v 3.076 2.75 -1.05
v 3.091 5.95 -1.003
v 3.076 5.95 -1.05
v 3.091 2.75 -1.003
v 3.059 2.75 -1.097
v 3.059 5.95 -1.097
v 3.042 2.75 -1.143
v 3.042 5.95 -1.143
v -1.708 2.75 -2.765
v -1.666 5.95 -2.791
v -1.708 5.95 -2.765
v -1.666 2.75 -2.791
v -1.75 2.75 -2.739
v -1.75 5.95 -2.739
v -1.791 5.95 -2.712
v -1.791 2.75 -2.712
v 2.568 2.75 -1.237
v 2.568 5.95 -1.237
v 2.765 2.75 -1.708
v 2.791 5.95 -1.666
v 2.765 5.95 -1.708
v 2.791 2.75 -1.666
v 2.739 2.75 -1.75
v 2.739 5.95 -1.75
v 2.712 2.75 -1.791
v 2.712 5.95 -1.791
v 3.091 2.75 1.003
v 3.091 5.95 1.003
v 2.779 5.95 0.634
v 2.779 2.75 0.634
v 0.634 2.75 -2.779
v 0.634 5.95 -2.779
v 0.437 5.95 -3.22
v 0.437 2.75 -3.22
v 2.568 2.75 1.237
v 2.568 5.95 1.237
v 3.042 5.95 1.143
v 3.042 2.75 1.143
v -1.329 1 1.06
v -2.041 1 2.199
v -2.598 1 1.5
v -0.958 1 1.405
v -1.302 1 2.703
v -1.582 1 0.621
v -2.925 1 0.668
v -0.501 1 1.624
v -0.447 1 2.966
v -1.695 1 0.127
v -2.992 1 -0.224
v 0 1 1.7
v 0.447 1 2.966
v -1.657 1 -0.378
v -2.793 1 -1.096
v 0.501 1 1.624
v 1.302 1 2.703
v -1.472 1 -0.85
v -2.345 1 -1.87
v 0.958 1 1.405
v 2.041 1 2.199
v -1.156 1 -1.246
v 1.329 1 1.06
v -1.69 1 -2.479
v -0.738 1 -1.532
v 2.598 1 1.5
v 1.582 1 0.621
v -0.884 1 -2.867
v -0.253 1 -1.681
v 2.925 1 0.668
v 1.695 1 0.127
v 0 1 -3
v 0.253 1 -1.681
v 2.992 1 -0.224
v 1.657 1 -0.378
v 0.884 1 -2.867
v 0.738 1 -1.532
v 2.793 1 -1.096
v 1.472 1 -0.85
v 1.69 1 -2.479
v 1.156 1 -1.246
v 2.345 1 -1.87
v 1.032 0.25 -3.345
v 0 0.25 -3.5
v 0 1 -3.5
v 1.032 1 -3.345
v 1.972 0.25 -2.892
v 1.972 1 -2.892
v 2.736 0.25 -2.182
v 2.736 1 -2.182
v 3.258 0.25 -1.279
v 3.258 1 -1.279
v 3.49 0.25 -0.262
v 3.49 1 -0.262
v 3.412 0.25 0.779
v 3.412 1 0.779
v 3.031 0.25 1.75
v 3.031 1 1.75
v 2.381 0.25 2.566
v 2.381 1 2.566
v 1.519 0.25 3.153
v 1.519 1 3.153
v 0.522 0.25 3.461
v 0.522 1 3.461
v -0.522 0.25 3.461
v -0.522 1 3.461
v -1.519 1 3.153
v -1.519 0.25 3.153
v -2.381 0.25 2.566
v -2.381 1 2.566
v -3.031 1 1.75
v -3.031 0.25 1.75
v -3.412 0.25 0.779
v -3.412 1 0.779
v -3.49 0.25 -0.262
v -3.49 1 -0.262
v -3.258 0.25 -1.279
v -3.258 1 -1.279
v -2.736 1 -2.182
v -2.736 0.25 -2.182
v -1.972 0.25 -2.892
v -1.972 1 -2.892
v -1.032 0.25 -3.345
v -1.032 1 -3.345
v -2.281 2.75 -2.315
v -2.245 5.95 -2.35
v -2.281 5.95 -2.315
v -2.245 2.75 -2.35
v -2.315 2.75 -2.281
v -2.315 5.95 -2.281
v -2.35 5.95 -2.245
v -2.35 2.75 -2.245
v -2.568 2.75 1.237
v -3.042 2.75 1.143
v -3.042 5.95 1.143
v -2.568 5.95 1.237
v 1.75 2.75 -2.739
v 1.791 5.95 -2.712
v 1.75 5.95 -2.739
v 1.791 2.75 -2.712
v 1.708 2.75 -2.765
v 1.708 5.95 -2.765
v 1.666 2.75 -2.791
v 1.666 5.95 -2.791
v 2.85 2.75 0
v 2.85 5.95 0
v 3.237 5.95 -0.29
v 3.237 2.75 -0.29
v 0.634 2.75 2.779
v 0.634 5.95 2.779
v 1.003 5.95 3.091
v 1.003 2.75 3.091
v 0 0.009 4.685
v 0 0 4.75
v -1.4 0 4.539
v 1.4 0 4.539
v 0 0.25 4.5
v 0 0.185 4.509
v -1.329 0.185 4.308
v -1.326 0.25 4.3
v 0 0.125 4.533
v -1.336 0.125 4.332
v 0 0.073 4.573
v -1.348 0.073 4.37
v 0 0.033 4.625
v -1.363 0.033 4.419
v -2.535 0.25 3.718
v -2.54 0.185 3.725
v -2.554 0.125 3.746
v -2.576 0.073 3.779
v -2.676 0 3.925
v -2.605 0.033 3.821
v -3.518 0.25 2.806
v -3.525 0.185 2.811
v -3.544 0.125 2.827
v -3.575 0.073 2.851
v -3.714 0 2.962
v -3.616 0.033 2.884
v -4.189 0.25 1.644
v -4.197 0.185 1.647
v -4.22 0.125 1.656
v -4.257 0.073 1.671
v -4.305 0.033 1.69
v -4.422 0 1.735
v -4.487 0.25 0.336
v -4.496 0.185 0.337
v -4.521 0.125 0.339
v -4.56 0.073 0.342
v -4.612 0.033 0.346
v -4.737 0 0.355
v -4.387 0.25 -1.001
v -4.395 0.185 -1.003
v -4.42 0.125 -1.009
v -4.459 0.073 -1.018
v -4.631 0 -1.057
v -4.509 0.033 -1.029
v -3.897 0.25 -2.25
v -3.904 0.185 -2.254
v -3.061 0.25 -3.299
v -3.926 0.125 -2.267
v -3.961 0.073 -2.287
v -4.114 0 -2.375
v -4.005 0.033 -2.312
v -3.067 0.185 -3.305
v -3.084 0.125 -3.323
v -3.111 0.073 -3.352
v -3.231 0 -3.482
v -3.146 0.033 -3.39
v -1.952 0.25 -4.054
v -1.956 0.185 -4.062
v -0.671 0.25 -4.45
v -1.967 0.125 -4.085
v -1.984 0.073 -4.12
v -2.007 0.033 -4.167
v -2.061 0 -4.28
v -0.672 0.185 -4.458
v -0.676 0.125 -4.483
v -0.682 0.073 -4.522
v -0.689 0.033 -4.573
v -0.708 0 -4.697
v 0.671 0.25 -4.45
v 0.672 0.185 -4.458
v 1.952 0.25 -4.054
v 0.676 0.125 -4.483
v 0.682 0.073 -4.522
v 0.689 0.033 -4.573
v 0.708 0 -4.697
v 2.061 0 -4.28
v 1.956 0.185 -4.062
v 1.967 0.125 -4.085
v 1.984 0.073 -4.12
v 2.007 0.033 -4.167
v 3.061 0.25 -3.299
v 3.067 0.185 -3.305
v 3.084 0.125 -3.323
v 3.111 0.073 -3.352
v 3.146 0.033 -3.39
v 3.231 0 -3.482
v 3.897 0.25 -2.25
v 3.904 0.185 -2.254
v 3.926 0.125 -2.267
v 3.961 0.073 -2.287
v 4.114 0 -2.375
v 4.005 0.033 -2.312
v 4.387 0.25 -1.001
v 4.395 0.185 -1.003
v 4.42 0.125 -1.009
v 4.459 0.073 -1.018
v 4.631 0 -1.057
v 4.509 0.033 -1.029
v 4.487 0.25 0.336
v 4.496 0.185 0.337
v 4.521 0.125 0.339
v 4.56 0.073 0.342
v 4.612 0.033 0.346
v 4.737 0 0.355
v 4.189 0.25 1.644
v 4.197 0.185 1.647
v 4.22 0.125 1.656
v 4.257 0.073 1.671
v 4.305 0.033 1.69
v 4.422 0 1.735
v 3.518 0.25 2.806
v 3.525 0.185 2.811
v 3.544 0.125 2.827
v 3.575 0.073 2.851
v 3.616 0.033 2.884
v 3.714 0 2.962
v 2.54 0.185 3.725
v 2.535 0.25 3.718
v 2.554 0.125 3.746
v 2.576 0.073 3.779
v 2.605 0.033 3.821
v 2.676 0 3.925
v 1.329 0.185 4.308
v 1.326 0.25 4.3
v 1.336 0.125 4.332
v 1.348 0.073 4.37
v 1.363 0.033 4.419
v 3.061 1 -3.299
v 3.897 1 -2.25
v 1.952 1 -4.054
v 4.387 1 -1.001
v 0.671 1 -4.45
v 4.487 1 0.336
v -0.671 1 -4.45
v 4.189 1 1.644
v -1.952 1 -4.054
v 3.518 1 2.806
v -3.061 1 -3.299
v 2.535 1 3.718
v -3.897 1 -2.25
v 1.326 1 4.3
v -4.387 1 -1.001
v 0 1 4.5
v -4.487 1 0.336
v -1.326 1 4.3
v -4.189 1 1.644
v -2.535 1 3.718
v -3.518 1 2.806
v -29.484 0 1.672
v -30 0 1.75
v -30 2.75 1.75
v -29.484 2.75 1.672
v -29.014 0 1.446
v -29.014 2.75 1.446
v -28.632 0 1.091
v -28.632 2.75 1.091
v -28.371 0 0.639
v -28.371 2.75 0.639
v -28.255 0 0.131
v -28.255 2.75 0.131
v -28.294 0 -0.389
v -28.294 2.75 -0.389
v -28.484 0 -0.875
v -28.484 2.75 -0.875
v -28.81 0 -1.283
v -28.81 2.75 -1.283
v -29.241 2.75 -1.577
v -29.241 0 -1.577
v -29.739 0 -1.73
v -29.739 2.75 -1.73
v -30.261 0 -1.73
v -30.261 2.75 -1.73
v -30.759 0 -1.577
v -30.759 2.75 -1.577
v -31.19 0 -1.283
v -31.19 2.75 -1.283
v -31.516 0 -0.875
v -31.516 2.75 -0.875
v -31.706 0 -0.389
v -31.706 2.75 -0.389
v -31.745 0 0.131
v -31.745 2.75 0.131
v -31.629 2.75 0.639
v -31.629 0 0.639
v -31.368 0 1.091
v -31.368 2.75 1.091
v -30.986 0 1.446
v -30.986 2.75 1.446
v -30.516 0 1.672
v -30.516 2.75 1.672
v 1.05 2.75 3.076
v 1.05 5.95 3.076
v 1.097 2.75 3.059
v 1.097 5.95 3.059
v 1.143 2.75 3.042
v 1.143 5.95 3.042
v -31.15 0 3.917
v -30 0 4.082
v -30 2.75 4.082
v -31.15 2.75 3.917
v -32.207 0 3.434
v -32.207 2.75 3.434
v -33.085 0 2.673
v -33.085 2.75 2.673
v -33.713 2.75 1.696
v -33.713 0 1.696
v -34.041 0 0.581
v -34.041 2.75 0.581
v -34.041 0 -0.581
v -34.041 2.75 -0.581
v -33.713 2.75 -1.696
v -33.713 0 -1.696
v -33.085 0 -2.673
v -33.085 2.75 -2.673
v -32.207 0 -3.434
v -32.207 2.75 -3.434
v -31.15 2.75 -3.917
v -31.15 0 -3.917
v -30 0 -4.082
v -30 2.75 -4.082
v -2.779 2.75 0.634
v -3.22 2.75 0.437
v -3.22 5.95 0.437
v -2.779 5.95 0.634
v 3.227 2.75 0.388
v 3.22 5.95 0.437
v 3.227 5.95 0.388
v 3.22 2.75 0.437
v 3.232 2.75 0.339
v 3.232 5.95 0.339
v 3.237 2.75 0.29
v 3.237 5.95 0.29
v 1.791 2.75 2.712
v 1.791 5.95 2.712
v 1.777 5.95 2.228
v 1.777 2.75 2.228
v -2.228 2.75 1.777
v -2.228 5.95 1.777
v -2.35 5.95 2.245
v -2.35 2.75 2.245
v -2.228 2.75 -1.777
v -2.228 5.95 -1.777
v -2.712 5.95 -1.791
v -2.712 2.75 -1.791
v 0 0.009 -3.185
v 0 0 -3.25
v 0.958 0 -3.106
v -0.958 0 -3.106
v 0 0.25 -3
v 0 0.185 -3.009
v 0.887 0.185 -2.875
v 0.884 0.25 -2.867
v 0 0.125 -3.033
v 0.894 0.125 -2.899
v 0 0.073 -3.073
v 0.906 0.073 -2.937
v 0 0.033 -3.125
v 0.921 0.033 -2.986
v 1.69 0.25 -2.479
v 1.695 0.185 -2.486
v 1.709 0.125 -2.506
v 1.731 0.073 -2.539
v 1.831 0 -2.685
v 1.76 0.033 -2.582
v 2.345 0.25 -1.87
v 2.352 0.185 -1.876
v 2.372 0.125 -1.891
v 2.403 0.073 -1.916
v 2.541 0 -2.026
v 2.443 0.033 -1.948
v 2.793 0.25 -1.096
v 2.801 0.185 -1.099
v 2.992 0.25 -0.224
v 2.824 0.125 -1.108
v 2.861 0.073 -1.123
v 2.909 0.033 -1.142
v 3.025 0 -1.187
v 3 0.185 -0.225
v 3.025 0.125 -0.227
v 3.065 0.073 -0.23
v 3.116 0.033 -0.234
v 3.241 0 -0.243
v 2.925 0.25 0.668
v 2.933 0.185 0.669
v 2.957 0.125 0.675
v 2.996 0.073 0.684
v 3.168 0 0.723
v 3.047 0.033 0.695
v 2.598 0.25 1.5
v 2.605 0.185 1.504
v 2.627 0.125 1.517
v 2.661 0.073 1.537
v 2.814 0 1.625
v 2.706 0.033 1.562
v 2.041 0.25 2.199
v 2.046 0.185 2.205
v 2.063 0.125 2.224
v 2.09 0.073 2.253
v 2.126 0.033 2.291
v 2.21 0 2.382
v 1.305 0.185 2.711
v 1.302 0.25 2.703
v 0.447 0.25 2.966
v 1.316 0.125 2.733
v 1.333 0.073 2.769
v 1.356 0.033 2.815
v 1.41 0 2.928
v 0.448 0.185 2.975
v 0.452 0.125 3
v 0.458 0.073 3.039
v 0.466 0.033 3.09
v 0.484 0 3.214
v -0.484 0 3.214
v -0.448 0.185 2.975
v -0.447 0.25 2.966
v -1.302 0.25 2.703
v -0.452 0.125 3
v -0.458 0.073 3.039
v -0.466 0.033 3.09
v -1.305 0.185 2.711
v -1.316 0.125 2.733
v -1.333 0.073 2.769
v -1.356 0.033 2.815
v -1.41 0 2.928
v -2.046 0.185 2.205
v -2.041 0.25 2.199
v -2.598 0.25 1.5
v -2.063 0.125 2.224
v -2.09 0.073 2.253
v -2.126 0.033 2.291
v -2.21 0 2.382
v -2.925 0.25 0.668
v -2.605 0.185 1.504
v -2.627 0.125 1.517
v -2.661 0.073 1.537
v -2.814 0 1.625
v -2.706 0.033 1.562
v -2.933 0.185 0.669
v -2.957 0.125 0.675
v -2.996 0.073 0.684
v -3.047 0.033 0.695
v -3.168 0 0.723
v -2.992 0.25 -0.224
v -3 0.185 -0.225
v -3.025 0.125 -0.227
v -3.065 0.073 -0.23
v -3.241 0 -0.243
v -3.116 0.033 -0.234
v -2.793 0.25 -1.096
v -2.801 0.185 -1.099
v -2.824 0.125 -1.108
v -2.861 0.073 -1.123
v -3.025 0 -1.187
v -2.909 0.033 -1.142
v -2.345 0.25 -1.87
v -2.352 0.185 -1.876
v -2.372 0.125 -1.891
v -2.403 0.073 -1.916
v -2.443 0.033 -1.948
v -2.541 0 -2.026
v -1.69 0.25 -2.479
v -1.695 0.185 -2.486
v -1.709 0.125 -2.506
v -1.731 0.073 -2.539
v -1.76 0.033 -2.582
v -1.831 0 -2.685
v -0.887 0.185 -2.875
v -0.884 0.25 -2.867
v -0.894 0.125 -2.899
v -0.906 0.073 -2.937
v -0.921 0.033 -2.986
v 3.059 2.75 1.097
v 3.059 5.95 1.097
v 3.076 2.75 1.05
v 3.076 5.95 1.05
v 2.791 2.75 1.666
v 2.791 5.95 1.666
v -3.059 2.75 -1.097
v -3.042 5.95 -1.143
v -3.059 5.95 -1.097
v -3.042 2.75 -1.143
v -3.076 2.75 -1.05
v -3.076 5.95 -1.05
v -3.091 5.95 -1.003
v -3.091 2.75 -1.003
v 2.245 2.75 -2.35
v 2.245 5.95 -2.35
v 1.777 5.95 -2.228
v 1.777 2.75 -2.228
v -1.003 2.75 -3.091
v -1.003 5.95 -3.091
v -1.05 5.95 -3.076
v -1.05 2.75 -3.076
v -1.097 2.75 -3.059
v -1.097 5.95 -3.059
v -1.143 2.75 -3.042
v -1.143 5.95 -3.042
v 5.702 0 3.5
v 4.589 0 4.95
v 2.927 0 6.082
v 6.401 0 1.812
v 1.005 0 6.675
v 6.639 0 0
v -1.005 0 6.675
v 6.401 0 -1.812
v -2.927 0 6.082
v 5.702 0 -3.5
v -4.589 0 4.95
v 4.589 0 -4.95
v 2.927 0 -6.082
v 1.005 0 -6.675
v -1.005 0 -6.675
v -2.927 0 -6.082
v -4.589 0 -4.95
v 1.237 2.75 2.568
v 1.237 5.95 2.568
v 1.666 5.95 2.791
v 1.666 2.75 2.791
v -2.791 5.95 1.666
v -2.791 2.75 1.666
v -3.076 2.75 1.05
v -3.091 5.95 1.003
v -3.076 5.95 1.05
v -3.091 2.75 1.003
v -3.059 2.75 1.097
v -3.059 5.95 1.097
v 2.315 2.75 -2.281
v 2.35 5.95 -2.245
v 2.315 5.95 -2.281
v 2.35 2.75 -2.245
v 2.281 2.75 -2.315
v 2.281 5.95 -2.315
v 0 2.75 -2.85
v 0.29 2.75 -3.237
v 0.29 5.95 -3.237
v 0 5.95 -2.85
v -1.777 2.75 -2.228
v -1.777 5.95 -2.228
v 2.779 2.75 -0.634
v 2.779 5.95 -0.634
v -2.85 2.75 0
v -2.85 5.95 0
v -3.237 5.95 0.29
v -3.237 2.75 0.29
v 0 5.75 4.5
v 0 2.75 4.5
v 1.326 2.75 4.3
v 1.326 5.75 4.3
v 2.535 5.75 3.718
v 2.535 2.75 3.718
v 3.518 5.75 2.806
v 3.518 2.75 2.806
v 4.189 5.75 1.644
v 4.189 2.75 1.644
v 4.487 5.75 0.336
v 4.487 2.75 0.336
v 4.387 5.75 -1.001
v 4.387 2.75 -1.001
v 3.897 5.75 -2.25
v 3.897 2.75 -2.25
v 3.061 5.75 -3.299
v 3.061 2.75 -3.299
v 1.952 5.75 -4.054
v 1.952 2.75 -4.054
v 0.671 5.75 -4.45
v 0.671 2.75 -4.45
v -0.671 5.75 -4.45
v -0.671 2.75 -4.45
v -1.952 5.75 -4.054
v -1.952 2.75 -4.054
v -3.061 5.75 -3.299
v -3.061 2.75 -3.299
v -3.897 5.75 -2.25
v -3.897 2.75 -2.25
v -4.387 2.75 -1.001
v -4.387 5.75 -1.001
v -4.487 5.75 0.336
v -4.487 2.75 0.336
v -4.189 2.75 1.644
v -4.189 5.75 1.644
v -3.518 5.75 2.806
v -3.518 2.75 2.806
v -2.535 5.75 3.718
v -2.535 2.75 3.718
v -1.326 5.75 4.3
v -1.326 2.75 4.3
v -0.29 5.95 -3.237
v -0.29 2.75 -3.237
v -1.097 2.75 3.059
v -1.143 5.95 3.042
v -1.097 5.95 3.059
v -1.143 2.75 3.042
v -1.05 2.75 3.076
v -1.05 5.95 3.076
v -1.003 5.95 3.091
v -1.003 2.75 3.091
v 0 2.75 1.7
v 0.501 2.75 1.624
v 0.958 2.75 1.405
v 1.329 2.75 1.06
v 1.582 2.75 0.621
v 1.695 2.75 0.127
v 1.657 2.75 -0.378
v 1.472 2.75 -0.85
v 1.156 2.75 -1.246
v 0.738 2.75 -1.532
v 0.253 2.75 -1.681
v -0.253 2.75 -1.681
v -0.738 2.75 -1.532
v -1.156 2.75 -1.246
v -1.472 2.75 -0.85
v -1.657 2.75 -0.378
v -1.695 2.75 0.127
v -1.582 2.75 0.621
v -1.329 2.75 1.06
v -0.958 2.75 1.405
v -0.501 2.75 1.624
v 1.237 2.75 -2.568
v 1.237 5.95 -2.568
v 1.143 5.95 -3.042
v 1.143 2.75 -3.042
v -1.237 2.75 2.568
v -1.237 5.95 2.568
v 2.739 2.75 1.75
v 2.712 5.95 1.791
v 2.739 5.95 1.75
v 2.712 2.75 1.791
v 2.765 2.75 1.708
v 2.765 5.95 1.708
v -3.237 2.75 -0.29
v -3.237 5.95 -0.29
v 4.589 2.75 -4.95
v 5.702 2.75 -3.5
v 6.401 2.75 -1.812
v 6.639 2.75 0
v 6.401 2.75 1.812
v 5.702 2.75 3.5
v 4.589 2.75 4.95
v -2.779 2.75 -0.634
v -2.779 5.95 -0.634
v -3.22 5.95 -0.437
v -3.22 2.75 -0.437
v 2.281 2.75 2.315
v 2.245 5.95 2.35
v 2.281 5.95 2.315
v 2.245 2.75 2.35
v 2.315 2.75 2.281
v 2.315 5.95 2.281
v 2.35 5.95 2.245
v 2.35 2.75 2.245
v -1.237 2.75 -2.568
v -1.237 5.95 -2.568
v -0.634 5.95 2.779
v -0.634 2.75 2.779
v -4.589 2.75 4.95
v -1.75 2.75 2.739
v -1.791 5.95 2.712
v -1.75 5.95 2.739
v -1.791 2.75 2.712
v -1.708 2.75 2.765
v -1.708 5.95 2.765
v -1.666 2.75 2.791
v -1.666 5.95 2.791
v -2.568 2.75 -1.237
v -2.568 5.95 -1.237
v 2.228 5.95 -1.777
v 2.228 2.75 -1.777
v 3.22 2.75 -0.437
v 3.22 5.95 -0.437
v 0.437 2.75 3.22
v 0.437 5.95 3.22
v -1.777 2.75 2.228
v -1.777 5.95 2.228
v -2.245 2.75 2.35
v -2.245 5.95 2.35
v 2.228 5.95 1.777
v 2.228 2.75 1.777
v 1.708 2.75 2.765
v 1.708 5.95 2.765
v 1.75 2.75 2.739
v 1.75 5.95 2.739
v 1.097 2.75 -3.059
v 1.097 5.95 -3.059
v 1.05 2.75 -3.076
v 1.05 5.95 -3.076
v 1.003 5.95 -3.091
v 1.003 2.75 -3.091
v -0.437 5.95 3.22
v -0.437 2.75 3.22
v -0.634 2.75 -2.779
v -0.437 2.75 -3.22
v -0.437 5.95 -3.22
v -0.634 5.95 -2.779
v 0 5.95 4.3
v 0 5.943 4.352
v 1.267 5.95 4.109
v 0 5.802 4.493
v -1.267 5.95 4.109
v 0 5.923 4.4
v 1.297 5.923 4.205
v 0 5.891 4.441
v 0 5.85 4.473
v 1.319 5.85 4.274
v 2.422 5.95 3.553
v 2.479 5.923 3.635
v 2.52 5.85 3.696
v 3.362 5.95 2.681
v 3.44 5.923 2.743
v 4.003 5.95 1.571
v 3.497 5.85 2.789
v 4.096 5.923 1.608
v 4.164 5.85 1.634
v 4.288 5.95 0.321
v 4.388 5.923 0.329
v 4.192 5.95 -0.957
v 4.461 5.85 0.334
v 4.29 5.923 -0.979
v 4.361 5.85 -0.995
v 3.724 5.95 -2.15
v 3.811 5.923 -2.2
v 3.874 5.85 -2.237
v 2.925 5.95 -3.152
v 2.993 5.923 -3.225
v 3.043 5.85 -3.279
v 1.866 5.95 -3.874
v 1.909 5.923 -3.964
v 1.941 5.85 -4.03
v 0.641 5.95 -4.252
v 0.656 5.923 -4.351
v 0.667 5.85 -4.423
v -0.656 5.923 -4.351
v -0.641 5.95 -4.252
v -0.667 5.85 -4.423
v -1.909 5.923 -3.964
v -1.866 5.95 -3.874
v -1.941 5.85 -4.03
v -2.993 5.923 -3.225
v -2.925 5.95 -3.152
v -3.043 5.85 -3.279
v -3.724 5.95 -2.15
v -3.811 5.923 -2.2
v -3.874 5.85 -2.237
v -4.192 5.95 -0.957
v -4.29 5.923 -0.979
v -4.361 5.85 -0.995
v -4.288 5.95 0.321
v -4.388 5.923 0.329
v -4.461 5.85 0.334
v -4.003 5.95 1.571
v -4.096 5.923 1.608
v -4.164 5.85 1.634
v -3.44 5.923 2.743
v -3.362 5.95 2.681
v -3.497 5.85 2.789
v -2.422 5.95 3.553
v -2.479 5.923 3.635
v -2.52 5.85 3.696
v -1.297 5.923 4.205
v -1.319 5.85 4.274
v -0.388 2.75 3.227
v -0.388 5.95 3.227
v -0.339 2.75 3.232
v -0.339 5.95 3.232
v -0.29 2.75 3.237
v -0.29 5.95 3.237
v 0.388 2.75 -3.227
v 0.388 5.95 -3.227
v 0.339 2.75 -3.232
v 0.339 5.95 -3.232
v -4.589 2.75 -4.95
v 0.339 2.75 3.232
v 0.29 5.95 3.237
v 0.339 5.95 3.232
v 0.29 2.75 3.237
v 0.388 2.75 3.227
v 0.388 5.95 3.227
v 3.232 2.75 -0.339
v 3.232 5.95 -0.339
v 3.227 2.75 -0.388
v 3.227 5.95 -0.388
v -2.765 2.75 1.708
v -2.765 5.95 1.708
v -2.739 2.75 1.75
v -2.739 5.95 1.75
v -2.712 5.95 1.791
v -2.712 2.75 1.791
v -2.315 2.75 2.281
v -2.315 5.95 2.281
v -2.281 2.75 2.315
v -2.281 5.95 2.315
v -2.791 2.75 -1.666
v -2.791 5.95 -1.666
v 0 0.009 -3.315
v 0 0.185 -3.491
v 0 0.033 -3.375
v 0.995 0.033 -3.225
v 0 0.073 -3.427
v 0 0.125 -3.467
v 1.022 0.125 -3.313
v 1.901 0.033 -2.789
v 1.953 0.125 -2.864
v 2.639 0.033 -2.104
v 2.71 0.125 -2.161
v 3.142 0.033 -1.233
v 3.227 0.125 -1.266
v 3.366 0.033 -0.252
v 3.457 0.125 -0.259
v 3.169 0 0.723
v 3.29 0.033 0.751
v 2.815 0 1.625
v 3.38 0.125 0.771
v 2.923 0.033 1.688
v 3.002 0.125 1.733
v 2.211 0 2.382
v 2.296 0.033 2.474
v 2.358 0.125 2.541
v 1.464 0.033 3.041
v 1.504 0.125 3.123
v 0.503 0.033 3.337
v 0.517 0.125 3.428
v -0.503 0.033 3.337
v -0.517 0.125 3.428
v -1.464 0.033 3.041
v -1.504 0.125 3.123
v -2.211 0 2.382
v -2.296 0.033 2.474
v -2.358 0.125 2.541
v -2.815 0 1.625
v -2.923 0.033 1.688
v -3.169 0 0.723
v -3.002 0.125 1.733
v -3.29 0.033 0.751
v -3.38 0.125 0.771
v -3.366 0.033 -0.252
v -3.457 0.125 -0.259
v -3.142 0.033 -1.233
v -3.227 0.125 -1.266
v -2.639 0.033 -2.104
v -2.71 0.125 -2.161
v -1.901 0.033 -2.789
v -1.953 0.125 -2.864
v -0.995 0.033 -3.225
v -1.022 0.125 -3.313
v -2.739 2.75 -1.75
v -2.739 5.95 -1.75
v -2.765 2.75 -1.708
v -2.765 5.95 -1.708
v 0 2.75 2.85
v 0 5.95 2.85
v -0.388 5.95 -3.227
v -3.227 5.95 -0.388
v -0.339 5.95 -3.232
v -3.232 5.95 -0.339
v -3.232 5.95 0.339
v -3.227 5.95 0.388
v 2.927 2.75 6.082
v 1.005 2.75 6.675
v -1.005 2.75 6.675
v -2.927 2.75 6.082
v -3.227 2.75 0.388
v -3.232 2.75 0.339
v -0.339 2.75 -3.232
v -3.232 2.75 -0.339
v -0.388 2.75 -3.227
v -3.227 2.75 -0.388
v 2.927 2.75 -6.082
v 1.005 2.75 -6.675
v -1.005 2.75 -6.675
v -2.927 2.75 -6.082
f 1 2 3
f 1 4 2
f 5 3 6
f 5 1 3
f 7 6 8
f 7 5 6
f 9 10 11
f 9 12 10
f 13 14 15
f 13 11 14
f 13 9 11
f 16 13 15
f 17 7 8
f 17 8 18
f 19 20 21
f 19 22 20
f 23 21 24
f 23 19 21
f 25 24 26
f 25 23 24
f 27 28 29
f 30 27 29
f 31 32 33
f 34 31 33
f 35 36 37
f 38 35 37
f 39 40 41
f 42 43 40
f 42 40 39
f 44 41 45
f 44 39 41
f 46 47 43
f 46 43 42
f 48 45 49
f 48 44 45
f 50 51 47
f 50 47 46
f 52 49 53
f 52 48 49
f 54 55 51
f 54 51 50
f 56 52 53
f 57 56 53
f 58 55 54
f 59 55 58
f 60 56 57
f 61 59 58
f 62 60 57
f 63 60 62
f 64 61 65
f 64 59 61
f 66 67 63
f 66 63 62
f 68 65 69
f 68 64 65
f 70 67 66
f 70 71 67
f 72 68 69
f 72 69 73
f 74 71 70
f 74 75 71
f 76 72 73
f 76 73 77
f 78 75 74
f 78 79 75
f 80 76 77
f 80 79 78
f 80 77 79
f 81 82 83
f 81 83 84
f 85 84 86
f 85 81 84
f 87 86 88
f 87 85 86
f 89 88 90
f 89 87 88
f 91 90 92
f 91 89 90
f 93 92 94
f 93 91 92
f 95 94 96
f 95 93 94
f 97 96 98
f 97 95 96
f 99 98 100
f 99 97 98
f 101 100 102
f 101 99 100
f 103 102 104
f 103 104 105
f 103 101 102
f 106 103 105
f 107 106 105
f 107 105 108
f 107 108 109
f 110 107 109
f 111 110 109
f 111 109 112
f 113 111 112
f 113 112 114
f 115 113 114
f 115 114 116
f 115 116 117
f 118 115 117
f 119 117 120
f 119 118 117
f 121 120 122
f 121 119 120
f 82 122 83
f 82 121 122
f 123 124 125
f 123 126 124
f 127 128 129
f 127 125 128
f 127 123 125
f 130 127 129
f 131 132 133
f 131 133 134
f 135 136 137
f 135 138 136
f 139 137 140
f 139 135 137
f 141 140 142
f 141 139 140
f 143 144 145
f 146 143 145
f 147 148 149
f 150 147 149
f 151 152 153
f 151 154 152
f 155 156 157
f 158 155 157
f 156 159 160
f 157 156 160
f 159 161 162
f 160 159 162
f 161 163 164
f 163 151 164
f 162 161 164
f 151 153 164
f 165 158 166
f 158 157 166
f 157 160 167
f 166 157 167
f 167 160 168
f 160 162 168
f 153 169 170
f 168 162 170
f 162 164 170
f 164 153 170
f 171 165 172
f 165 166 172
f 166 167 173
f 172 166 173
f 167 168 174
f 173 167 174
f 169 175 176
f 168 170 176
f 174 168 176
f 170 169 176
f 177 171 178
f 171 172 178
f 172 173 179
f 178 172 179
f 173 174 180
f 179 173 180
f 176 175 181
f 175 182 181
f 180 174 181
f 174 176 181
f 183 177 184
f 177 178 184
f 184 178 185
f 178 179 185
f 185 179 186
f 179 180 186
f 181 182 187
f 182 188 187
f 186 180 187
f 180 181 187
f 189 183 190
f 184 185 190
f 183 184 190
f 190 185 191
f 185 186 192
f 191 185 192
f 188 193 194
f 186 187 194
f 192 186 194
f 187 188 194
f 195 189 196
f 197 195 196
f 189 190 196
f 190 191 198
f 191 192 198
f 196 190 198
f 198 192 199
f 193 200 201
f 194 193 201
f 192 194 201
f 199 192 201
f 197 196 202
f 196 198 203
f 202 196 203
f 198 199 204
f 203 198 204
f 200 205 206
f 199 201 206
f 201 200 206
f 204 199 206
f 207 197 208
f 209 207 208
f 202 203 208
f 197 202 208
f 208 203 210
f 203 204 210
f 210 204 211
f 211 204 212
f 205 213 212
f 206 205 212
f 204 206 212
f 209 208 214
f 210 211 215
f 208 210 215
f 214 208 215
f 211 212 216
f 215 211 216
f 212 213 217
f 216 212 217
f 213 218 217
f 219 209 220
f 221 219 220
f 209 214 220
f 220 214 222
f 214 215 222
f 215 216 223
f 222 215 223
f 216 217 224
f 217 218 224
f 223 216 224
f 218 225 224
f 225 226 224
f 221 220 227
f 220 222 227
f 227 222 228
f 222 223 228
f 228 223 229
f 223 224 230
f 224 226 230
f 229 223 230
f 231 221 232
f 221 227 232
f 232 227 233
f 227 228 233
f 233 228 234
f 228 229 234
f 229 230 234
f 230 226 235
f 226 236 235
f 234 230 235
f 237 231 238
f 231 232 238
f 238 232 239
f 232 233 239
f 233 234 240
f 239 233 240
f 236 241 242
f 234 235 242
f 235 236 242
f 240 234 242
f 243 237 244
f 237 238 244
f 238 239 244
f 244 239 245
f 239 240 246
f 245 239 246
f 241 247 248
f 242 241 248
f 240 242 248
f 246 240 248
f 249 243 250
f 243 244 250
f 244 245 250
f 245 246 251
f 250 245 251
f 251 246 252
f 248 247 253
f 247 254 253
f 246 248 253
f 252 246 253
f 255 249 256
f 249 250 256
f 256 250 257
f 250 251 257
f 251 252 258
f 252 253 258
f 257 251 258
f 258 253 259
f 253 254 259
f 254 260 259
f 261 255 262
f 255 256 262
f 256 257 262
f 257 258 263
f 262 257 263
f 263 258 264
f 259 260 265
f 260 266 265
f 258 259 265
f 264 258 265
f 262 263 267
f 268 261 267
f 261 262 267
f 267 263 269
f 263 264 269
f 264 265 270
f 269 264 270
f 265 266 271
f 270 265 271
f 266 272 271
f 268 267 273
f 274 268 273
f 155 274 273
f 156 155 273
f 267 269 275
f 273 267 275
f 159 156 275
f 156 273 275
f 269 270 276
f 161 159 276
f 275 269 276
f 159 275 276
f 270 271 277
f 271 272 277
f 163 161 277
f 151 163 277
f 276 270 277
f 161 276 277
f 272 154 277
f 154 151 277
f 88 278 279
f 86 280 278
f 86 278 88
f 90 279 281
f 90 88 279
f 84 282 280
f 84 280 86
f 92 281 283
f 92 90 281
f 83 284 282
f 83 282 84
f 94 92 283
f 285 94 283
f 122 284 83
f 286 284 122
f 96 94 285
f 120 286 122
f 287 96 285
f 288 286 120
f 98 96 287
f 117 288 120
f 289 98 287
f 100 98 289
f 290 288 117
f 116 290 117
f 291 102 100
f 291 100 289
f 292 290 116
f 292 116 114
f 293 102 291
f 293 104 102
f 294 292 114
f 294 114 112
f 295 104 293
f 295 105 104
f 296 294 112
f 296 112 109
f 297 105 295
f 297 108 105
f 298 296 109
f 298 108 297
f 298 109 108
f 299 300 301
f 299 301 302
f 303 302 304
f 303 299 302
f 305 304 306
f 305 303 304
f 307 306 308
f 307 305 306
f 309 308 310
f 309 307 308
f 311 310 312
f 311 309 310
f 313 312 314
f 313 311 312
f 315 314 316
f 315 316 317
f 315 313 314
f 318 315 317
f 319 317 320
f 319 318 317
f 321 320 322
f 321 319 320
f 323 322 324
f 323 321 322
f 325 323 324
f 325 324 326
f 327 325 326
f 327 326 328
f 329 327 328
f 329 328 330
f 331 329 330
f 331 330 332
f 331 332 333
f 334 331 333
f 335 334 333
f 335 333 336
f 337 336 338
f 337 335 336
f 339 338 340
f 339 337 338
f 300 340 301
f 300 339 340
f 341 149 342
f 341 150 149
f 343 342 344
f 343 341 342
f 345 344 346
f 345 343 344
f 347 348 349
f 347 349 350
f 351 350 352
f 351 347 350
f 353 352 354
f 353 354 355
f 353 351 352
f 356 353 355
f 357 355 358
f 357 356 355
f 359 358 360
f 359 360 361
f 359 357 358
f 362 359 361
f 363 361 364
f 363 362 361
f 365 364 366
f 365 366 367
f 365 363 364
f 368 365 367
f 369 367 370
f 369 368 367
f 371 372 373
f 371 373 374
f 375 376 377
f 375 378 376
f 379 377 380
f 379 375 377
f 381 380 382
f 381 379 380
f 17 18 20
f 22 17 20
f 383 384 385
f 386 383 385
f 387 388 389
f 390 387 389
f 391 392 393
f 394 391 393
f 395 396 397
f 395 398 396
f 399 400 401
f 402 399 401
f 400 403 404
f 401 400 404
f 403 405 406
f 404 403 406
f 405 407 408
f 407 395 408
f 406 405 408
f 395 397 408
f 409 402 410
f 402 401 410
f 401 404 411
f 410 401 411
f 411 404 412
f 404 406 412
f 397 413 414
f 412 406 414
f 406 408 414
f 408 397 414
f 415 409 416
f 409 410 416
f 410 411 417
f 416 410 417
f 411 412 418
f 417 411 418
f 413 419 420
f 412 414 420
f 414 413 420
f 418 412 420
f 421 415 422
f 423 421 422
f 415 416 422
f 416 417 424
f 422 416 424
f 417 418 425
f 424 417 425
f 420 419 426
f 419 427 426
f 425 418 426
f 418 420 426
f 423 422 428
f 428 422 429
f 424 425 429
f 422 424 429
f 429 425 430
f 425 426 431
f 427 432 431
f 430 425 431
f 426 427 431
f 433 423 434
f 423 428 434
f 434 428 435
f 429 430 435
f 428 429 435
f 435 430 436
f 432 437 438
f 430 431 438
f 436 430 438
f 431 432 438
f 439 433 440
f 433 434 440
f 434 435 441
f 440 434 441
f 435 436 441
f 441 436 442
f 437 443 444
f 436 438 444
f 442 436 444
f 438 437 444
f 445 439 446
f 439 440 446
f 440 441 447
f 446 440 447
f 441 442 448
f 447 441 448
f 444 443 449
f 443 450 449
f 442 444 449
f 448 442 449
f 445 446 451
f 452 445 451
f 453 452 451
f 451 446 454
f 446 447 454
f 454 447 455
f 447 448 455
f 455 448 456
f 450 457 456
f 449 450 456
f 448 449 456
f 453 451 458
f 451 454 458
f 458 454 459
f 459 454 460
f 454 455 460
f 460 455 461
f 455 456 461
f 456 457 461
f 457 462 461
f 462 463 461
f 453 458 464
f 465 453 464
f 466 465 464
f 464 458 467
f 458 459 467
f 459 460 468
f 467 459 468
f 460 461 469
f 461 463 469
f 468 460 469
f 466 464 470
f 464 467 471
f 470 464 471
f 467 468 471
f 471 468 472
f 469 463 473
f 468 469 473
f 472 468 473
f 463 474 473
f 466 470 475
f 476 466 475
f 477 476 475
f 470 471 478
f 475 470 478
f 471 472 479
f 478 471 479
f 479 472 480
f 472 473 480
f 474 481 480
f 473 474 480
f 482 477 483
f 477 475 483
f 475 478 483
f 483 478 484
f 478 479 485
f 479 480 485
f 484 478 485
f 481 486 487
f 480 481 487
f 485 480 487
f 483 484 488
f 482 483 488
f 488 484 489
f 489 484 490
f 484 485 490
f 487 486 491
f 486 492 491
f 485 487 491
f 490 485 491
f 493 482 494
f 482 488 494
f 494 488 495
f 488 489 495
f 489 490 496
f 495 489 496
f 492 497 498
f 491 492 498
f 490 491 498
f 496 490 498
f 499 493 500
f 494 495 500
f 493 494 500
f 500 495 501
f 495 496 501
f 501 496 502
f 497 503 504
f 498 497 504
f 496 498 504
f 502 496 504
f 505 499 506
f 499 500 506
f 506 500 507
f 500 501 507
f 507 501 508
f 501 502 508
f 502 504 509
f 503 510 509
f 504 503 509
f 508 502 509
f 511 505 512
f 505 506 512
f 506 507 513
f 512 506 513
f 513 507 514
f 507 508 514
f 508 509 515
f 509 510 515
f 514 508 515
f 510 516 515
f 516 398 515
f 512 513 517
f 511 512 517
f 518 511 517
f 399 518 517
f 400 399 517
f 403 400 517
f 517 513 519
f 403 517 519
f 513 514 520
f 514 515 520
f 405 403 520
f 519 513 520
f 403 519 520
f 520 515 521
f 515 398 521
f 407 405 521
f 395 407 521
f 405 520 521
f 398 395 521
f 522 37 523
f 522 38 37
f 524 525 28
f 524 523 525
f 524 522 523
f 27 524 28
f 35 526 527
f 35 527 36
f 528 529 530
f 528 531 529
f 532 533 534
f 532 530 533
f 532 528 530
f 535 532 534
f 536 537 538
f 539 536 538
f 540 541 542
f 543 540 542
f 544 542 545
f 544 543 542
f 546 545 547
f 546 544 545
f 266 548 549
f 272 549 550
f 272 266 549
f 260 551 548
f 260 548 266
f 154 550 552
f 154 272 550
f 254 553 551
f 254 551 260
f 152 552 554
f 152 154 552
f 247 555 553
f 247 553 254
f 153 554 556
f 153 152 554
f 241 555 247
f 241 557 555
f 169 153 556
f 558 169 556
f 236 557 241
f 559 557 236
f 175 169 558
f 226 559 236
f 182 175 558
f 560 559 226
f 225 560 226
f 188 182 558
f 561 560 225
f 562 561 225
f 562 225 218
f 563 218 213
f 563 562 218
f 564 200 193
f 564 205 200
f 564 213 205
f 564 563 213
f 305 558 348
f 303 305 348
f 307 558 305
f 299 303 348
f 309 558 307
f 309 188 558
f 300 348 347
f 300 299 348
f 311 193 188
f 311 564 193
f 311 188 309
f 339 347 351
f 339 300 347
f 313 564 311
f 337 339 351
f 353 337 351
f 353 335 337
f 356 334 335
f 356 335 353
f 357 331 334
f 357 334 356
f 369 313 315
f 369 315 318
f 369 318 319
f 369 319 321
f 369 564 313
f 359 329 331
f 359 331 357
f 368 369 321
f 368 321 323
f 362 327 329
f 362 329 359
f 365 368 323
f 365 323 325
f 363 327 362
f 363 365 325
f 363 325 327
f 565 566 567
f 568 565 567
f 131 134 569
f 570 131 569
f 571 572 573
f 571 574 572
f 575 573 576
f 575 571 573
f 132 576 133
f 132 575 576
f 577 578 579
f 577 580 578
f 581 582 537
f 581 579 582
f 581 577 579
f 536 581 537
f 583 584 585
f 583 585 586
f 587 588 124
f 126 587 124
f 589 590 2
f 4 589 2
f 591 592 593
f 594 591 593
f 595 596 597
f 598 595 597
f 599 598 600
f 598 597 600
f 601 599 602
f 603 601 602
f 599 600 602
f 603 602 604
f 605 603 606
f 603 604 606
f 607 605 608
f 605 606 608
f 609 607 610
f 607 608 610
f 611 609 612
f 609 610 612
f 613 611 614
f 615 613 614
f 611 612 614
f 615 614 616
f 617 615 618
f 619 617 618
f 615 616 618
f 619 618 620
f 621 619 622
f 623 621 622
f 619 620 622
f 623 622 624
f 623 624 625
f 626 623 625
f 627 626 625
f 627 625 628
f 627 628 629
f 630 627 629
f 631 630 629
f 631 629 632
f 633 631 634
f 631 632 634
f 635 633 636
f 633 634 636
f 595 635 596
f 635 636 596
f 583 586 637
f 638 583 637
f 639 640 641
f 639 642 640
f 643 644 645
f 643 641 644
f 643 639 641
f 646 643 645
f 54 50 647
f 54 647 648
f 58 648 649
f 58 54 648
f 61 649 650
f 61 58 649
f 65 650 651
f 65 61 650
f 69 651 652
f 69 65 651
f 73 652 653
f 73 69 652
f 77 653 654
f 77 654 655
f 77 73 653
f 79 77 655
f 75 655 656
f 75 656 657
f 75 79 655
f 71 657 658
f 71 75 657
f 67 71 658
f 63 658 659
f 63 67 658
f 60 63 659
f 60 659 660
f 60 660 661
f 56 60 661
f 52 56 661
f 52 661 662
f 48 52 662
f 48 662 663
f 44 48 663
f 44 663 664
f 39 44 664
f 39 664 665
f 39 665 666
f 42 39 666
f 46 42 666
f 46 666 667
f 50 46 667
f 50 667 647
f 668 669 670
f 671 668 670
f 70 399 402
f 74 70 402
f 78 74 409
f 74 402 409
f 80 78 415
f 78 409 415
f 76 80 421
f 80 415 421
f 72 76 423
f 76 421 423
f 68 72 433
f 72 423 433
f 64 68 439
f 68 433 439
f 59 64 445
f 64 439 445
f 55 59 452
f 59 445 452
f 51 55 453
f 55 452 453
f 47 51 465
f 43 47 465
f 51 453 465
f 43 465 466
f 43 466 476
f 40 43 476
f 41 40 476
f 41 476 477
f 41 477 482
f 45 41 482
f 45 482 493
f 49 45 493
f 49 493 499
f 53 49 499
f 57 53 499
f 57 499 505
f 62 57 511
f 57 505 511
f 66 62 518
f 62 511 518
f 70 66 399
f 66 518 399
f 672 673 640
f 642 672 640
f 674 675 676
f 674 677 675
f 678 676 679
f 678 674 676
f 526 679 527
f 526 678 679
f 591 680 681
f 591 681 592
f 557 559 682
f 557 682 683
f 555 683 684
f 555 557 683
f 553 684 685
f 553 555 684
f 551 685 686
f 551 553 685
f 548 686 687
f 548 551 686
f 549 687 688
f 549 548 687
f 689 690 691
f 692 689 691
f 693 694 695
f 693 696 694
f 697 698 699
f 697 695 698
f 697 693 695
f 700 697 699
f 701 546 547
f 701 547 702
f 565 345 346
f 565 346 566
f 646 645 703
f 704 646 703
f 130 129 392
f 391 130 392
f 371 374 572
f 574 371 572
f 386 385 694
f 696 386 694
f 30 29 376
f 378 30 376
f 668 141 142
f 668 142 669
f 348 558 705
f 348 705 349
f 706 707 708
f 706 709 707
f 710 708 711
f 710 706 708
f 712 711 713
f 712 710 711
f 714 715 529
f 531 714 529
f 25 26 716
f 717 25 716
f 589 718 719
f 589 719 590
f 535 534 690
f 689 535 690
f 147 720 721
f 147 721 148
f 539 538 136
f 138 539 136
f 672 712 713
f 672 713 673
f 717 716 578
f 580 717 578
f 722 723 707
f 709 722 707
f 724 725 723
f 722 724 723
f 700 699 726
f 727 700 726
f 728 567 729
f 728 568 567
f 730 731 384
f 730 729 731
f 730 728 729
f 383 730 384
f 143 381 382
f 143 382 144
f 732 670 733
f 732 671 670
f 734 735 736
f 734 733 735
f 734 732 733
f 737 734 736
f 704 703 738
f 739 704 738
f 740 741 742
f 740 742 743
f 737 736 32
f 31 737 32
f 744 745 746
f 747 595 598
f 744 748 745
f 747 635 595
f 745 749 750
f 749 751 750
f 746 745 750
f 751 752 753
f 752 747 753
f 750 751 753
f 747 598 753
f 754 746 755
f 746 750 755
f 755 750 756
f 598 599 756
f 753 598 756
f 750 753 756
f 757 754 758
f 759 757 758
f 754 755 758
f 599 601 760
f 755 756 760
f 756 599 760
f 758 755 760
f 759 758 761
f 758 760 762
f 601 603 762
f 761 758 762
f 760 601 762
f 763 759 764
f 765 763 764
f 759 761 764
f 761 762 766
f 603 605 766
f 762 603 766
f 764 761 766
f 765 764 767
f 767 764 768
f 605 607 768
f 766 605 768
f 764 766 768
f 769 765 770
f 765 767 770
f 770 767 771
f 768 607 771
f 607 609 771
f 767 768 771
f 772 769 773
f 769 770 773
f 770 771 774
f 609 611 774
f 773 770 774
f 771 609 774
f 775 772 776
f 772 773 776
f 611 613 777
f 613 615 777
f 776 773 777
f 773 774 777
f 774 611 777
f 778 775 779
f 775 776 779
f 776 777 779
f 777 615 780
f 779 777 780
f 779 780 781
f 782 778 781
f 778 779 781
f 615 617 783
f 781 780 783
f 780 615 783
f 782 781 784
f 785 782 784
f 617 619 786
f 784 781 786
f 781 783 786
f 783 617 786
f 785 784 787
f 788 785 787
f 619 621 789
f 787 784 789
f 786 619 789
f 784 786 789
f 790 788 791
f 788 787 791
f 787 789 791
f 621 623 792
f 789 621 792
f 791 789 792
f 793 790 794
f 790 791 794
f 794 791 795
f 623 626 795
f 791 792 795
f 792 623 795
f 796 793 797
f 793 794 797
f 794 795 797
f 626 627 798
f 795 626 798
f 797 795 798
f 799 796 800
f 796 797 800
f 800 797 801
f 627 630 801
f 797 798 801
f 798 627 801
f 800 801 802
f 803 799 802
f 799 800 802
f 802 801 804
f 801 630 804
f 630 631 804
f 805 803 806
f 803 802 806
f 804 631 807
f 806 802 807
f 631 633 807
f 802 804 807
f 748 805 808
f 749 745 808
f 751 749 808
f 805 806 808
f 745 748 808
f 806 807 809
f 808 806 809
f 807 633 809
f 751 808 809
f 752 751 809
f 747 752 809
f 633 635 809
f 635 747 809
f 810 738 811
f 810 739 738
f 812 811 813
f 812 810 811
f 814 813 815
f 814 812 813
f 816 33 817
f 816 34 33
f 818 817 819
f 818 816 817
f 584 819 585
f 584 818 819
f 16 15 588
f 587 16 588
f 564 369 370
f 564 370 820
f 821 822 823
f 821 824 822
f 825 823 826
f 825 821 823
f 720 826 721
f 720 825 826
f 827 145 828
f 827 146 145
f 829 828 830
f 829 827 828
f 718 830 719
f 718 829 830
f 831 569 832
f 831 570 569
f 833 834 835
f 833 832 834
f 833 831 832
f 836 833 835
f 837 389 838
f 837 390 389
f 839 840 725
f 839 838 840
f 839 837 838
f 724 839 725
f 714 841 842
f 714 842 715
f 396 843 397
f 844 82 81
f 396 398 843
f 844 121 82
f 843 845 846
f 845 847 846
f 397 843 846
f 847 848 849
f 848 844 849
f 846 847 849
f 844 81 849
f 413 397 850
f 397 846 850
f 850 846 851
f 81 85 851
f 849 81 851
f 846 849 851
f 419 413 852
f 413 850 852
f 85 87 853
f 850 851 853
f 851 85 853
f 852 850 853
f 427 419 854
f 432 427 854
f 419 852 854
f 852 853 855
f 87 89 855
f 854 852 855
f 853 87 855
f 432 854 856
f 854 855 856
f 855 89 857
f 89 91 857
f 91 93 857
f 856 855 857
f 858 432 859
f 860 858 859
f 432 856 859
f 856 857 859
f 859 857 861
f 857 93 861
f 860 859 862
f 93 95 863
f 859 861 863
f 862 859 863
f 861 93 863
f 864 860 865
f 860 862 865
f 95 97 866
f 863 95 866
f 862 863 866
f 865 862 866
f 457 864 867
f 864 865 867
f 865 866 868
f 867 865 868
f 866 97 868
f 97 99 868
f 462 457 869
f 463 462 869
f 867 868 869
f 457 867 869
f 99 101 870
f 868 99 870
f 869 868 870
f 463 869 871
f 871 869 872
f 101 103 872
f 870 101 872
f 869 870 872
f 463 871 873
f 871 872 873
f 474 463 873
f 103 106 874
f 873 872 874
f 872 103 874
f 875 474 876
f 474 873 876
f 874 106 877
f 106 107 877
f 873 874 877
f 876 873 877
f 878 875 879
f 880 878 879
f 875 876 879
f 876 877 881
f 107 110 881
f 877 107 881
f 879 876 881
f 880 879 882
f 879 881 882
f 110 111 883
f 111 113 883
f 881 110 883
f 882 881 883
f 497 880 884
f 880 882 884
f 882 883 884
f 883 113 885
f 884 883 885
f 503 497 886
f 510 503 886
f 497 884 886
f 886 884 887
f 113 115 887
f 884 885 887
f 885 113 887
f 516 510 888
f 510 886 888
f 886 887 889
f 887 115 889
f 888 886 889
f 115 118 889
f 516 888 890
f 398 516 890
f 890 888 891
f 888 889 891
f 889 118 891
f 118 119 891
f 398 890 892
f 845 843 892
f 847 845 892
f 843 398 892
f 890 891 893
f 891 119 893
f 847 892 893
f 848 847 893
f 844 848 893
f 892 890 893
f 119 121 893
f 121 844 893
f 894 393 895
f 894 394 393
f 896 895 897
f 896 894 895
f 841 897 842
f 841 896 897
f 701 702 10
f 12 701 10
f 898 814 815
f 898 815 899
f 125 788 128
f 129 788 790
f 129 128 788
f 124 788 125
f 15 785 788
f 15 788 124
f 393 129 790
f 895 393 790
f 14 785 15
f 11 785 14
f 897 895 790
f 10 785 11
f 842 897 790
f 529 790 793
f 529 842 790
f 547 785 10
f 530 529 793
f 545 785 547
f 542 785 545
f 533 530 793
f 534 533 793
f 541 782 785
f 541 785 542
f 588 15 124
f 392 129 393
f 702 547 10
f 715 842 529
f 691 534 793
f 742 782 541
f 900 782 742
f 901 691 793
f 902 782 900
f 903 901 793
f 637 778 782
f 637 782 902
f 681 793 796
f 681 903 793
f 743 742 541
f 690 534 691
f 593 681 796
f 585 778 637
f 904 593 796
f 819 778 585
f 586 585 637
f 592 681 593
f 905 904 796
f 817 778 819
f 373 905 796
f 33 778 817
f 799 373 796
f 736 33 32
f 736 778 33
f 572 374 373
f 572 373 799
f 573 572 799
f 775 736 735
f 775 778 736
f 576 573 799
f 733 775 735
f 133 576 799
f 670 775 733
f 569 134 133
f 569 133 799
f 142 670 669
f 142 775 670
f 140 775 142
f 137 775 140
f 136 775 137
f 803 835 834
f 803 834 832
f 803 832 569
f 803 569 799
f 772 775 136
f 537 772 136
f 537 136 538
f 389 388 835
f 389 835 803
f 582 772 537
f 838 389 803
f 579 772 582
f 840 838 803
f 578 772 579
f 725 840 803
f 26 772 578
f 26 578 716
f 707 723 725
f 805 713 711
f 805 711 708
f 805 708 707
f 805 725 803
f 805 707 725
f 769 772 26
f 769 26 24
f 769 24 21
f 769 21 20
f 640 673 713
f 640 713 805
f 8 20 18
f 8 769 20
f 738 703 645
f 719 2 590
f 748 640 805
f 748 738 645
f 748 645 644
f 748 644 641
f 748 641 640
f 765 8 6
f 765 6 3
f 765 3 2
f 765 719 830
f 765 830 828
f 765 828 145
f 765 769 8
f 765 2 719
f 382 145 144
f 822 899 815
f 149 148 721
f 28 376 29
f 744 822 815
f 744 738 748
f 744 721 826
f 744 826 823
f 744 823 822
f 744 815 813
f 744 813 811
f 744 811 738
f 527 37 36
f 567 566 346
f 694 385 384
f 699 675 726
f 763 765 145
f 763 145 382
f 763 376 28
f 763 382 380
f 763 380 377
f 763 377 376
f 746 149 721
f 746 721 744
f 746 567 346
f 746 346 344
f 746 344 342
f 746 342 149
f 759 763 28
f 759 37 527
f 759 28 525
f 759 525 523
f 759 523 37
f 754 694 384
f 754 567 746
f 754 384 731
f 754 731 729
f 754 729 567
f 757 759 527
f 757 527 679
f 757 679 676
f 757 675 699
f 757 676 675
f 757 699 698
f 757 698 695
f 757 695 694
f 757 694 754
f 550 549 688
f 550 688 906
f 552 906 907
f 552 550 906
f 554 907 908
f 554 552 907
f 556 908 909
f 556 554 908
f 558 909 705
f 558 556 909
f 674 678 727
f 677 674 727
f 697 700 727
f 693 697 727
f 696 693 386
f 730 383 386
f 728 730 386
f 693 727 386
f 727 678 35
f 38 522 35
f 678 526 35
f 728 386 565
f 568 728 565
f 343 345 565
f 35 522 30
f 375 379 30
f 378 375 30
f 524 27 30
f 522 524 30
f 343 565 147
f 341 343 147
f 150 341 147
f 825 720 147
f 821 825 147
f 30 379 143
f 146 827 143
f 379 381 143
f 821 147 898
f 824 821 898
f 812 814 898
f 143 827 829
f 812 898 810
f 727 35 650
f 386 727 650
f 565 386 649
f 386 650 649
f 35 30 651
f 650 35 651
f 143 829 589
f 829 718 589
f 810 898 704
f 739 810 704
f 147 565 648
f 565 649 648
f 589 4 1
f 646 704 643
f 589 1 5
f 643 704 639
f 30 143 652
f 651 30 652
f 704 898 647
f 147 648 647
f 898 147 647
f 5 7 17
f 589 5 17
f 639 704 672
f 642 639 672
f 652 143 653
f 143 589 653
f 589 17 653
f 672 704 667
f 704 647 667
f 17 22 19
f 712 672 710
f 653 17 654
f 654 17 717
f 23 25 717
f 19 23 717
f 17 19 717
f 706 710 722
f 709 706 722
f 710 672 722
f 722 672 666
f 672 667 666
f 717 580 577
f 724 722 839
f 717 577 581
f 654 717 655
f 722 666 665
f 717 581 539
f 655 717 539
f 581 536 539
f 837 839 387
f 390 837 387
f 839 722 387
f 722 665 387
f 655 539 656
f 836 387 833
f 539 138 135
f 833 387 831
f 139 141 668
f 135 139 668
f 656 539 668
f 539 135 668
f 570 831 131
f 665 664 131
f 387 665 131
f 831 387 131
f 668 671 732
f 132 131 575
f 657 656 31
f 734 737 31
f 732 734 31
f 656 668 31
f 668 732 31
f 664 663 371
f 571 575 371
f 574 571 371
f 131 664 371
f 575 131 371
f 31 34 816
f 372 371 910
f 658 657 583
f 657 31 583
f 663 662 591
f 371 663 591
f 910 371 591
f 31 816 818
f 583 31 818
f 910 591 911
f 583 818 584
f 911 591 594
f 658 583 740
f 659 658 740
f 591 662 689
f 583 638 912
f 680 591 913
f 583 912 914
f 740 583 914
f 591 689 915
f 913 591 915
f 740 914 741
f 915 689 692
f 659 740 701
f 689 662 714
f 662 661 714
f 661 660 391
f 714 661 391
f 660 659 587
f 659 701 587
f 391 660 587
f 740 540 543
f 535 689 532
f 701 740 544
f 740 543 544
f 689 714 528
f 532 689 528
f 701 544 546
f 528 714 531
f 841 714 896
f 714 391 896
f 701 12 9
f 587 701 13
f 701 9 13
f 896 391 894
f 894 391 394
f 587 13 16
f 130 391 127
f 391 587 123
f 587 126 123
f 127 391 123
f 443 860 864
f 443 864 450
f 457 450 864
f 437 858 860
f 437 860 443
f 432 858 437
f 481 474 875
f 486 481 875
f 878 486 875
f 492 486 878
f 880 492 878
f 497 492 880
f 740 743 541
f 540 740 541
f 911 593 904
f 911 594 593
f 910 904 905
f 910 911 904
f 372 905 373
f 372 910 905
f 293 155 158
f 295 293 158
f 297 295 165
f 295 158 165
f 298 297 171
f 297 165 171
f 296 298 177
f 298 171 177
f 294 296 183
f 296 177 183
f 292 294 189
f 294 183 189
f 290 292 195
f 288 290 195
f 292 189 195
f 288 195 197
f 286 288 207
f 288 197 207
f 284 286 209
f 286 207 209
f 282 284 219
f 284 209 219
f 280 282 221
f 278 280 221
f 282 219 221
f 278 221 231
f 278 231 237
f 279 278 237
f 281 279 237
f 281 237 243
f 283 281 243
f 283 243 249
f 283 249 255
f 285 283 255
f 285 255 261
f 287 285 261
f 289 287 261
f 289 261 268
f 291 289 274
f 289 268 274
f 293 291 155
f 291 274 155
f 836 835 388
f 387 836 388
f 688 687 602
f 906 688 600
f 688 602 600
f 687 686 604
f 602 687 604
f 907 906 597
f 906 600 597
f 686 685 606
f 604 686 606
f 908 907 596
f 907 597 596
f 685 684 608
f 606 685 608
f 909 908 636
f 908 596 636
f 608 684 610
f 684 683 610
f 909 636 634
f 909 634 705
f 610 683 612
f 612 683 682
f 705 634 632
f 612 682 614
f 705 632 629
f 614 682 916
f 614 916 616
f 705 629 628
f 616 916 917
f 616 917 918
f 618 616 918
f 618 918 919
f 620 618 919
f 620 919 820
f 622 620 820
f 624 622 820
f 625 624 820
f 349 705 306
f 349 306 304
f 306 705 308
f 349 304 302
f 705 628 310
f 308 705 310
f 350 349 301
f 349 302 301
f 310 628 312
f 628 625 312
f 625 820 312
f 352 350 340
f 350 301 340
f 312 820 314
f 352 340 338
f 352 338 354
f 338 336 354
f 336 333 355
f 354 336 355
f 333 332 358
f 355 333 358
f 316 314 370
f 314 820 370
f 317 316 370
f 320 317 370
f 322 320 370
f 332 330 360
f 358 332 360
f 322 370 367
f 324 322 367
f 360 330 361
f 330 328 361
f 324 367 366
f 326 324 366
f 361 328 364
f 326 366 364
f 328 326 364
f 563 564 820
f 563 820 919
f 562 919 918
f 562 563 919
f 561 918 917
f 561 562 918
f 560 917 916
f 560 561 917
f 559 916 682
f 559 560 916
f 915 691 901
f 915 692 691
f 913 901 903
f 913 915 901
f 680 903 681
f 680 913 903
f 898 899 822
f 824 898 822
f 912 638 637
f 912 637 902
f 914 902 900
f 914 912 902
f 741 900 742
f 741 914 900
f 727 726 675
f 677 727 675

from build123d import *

# Parameters (mm, degrees)
SKETCH1_R           = 1.7
SKETCH1_R_2         = 1.75
BOSS_EXTRUDE1_DEPTH = 2.75
SKETCH2_R           = 4.5
SKETCH2_R_2         = 3.25
BOSS_EXTRUDE2_DEPTH = 3.2
BOSS_EXTRUDE3_DEPTH = 3.2
CIRPATTERN1_COUNT   = 28
SKETCH4_R           = 4.5
SKETCH4_R_2         = 3.5
SKETCH4_R_3         = 3
SKETCH4_R_4         = 1.7
CUT_EXTRUDE1_DEPTH  = 1
FILLET1_R           = 0.25
FILLET2_R           = 0.2


with BuildPart() as part:
    # Sketch1 → Boss-Extrude1 (new body)
    with BuildSketch(Plane(origin=(0, 0, 0), x_dir=(1, 0, 0), z_dir=(0, 1, 0))):
        with BuildLine():
            Line((-30, 4.082414086), (-4.589117562, 4.95))
            ThreePointArc((-4.589117562, 4.95), (0, 6.75), (4.589117562, 4.95))
            ThreePointArc((4.589117562, 4.95), (6.639474696, 0), (4.589117562, -4.95))
            ThreePointArc((4.589117562, -4.95), (0, -6.75), (-4.589117562, -4.95))
            Line((-4.589117562, -4.95), (-30, -4.082414086))
            ThreePointArc((-30, -4.082414086), (-34.082414086, 0), (-30, 4.082414086))
        make_face()
        with Locations(Location((0, 0, 0), (0, 0, 270))):
            Circle(SKETCH1_R, mode=Mode.SUBTRACT)
        with Locations(Location((-30, 0, 0), (0, 0, 270))):
            Circle(SKETCH1_R_2, mode=Mode.SUBTRACT)
    extrude(amount=BOSS_EXTRUDE1_DEPTH)

    # Sketch2 → Boss-Extrude2 (add)
    with BuildSketch(Plane(origin=(0, 2.75, 0), x_dir=(1, 0, 0), z_dir=(0, 1, 0))):
        with Locations(Location((0, 0, 0), (0, 0, 270))):
            Circle(SKETCH2_R)
        with Locations(Location((0, 0, 0), (0, 0, 270))):
            Circle(SKETCH2_R_2, mode=Mode.SUBTRACT)
    extrude(amount=BOSS_EXTRUDE2_DEPTH)

    # Sketch3 → Boss-Extrude3 (add)
    with BuildSketch(Plane(origin=(0, 5.95, 0), x_dir=(1, 0, 0), z_dir=(0, 1, 0))):
        Polygon((-0.3, 3.25), (0.3, 3.25), (0, 2.85), align=None)
    boss_extrude3 = extrude(amount=-BOSS_EXTRUDE3_DEPTH)

    # CirPattern1: Boss-Extrude3 ×28 about axis
    cirpattern1_axis = Axis((0, 0, 0), (0, 1, 0))
    for i in range(1, CIRPATTERN1_COUNT):
        add(boss_extrude3.rotate(cirpattern1_axis, i * 360 / CIRPATTERN1_COUNT))

    # Sketch4 → Cut-Extrude1 (cut)
    # profile 1 of 2: a face of its own
    with BuildSketch(Plane.XZ):
        with Locations(Location((0, 0, 0), (0, 0, 90))):
            Circle(SKETCH4_R)
        with Locations(Location((0, 0, 0), (0, 0, 270))):
            Circle(SKETCH4_R_2, mode=Mode.SUBTRACT)
    # profile 2 of 2: a face of its own
    with BuildSketch(Plane.XZ):
        with Locations(Location((0, 0, 0), (0, 0, 270))):
            Circle(SKETCH4_R_3)
        with Locations(Location((0, 0, 0), (0, 0, 270))):
            Circle(SKETCH4_R_4, mode=Mode.SUBTRACT)
    extrude(amount=-CUT_EXTRUDE1_DEPTH, mode=Mode.SUBTRACT)

    # Fillet1
    fillet1_edges = [part.edges().sort_by_distance(p)[0] for p in [
        (0, 0, 3.5),
        (0, 0, -4.5),
        (0, 0, 3),
    ]]
    fillet(fillet1_edges, radius=FILLET1_R - 0.0001)  # a hair under: the kernel refuses the full size

    # Fillet2
    fillet2_edges = [part.edges().sort_by_distance(p)[0] for p in [
        (0, 5.95, -4.5),
    ]]
    fillet(fillet2_edges, radius=FILLET2_R)


solid = part.part
